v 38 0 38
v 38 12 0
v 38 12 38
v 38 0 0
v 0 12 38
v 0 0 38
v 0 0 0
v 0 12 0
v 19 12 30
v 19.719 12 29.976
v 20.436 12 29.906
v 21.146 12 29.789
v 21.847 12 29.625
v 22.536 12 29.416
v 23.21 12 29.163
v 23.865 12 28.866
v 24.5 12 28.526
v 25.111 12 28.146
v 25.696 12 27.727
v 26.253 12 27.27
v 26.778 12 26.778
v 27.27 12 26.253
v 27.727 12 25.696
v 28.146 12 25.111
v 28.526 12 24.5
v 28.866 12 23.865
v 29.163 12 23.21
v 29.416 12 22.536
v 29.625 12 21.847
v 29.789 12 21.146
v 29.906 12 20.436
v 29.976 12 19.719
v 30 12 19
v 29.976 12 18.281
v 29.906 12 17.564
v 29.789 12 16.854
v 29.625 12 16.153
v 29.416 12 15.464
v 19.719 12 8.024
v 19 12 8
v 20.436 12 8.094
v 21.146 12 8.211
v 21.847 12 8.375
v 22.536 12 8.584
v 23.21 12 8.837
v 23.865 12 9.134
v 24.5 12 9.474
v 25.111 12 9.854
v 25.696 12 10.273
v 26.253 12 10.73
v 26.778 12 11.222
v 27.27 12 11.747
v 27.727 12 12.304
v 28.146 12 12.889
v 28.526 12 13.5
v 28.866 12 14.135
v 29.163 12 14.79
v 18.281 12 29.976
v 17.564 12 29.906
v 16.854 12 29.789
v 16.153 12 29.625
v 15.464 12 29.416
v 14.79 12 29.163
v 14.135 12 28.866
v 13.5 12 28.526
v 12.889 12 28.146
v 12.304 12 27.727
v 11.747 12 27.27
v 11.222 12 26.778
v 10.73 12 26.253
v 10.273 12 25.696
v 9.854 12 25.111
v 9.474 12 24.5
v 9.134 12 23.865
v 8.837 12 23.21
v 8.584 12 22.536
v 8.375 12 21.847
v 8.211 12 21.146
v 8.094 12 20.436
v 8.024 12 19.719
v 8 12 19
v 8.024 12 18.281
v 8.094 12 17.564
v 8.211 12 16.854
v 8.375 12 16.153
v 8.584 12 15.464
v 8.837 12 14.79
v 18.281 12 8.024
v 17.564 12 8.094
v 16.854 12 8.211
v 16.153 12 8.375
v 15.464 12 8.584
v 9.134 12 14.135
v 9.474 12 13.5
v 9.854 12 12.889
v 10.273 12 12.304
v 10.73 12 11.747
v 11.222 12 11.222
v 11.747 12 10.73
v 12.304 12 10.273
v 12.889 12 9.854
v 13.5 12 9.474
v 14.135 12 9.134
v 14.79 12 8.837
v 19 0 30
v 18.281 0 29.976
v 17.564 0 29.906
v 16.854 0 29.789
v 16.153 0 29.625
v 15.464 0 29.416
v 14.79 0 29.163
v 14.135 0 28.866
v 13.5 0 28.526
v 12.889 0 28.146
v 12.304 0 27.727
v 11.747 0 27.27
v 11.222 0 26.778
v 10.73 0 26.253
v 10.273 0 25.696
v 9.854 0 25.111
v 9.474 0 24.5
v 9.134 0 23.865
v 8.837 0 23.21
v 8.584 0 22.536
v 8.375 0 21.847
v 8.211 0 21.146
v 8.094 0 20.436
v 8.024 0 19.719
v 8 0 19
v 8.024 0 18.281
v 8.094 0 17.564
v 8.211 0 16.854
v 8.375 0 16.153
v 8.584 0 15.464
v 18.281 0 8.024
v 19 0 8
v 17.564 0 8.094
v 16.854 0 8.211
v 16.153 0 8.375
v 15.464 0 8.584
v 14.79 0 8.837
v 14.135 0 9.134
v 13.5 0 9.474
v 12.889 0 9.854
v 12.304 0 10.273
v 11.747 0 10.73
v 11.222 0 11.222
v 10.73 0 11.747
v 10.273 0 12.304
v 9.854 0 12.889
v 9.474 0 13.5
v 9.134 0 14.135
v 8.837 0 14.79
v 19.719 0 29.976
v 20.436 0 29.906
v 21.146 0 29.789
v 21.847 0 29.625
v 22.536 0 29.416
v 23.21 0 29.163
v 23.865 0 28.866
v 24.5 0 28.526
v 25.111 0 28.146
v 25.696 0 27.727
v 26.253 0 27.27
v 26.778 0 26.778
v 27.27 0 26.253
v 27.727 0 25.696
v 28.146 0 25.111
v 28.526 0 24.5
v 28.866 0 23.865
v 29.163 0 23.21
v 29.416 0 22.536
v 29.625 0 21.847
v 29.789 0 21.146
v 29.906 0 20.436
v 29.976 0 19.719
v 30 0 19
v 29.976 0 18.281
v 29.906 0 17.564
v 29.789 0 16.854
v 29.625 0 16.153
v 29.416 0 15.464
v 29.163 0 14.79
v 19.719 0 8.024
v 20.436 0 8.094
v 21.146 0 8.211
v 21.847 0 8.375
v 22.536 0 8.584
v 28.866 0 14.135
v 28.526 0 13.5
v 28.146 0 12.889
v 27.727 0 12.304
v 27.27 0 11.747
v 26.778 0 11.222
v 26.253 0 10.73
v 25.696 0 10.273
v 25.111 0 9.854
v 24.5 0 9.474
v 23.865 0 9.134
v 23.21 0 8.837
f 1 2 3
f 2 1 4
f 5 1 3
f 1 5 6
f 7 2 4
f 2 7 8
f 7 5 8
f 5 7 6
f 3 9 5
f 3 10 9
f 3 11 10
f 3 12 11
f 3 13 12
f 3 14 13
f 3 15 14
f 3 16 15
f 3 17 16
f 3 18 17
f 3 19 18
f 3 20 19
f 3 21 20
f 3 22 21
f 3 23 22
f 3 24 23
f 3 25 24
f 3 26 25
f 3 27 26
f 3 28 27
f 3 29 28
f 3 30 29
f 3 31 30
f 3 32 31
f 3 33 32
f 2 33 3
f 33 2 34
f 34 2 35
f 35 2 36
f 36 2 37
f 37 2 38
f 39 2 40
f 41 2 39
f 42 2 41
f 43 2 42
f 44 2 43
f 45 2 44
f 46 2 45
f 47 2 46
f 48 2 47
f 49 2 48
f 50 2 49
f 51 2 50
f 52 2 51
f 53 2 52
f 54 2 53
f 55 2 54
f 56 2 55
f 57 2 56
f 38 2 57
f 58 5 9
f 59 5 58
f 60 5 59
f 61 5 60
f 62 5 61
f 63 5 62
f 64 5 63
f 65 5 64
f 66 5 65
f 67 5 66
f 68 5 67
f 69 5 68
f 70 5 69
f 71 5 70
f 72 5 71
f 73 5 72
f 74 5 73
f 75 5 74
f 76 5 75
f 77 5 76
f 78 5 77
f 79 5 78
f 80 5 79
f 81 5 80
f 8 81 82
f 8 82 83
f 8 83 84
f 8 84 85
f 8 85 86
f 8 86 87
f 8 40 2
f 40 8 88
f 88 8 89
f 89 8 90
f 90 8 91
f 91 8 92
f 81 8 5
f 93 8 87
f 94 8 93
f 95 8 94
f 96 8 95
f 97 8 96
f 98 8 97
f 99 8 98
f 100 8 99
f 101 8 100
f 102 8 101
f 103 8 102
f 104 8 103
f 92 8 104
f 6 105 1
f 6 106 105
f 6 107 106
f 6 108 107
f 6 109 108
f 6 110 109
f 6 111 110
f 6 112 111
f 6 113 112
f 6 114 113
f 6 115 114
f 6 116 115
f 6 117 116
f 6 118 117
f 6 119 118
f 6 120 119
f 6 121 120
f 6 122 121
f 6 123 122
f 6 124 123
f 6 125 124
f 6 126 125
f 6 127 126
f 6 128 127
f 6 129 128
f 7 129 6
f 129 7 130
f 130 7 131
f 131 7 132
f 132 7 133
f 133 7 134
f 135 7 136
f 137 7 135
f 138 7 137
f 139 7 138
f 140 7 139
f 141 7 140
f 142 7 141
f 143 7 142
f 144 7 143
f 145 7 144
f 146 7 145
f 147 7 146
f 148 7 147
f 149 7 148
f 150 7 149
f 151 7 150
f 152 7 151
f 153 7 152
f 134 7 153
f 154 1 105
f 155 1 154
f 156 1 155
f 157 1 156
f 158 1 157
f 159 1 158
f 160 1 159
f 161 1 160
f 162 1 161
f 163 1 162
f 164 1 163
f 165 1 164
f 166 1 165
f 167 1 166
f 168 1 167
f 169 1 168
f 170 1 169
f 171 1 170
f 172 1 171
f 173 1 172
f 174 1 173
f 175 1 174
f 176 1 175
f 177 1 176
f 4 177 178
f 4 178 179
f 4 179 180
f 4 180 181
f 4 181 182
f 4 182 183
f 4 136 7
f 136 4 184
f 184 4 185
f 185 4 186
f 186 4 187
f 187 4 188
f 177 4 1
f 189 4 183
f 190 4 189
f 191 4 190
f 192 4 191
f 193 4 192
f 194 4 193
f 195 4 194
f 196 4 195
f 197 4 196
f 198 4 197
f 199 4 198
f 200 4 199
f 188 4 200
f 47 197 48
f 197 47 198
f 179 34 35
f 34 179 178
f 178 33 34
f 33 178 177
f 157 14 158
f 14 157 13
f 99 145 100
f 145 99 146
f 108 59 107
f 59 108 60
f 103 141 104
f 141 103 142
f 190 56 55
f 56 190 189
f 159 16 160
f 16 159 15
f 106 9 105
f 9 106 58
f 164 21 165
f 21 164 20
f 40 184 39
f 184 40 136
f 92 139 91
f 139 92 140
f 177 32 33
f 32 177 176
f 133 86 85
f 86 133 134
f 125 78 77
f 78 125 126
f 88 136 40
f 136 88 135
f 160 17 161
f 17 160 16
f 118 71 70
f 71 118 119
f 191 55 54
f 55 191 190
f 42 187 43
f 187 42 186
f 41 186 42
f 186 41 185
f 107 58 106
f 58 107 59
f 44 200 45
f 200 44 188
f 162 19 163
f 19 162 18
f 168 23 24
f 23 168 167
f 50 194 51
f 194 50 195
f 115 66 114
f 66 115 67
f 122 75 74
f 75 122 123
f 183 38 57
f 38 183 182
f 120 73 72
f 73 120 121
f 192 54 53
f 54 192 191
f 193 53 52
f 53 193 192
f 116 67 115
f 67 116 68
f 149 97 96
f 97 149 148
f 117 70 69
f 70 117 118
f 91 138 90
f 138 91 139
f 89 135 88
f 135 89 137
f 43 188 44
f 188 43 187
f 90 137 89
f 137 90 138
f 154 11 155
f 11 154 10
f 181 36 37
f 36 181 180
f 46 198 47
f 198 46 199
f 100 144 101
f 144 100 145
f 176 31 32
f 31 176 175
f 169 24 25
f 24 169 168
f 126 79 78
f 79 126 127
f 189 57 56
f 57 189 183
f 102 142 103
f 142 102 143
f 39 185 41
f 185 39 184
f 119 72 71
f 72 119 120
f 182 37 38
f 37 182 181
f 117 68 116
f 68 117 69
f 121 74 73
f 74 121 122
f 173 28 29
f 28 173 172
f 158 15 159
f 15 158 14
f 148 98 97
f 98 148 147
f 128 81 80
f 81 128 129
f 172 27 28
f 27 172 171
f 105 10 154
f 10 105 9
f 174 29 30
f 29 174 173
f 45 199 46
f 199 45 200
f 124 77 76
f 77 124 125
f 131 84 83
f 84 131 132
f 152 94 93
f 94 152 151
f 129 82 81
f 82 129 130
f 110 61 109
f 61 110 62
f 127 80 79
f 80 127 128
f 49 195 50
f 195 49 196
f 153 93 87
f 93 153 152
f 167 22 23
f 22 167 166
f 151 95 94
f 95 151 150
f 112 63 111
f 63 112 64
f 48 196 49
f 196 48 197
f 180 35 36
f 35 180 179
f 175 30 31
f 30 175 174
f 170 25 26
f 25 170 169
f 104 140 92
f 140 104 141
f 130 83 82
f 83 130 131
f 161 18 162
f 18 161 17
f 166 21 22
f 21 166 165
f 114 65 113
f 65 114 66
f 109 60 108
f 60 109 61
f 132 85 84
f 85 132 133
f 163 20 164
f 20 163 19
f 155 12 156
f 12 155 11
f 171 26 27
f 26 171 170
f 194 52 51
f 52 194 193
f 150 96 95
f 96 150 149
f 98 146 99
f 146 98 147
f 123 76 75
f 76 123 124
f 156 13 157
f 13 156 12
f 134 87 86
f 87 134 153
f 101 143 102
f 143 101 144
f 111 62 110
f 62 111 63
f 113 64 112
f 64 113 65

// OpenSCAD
// A bearing seat block: a square block with a through-bore sized for a
// deep-groove bearing's outside diameter. The same nominal part exists in
// build123d (block.py); claims.py states the shared requirements once.
//
// $fn is pinned in the parameters partspec passes, never left to a viewer
// default: under D15 the resolution is part of the question.

bore_d = 22.0;   // bearing OD the seat holds — the contract cites ISO 15 for it
wall = 8.0;      // designer's choice
depth = 12.0;    // designer's choice
$fn = 96;

w = bore_d + 2 * wall;

difference() {
    cube([w, depth, w]);
    translate([w / 2, -1, w / 2])
        rotate([-90, 0, 0])
            cylinder(d = bore_d, h = depth + 2);
}
